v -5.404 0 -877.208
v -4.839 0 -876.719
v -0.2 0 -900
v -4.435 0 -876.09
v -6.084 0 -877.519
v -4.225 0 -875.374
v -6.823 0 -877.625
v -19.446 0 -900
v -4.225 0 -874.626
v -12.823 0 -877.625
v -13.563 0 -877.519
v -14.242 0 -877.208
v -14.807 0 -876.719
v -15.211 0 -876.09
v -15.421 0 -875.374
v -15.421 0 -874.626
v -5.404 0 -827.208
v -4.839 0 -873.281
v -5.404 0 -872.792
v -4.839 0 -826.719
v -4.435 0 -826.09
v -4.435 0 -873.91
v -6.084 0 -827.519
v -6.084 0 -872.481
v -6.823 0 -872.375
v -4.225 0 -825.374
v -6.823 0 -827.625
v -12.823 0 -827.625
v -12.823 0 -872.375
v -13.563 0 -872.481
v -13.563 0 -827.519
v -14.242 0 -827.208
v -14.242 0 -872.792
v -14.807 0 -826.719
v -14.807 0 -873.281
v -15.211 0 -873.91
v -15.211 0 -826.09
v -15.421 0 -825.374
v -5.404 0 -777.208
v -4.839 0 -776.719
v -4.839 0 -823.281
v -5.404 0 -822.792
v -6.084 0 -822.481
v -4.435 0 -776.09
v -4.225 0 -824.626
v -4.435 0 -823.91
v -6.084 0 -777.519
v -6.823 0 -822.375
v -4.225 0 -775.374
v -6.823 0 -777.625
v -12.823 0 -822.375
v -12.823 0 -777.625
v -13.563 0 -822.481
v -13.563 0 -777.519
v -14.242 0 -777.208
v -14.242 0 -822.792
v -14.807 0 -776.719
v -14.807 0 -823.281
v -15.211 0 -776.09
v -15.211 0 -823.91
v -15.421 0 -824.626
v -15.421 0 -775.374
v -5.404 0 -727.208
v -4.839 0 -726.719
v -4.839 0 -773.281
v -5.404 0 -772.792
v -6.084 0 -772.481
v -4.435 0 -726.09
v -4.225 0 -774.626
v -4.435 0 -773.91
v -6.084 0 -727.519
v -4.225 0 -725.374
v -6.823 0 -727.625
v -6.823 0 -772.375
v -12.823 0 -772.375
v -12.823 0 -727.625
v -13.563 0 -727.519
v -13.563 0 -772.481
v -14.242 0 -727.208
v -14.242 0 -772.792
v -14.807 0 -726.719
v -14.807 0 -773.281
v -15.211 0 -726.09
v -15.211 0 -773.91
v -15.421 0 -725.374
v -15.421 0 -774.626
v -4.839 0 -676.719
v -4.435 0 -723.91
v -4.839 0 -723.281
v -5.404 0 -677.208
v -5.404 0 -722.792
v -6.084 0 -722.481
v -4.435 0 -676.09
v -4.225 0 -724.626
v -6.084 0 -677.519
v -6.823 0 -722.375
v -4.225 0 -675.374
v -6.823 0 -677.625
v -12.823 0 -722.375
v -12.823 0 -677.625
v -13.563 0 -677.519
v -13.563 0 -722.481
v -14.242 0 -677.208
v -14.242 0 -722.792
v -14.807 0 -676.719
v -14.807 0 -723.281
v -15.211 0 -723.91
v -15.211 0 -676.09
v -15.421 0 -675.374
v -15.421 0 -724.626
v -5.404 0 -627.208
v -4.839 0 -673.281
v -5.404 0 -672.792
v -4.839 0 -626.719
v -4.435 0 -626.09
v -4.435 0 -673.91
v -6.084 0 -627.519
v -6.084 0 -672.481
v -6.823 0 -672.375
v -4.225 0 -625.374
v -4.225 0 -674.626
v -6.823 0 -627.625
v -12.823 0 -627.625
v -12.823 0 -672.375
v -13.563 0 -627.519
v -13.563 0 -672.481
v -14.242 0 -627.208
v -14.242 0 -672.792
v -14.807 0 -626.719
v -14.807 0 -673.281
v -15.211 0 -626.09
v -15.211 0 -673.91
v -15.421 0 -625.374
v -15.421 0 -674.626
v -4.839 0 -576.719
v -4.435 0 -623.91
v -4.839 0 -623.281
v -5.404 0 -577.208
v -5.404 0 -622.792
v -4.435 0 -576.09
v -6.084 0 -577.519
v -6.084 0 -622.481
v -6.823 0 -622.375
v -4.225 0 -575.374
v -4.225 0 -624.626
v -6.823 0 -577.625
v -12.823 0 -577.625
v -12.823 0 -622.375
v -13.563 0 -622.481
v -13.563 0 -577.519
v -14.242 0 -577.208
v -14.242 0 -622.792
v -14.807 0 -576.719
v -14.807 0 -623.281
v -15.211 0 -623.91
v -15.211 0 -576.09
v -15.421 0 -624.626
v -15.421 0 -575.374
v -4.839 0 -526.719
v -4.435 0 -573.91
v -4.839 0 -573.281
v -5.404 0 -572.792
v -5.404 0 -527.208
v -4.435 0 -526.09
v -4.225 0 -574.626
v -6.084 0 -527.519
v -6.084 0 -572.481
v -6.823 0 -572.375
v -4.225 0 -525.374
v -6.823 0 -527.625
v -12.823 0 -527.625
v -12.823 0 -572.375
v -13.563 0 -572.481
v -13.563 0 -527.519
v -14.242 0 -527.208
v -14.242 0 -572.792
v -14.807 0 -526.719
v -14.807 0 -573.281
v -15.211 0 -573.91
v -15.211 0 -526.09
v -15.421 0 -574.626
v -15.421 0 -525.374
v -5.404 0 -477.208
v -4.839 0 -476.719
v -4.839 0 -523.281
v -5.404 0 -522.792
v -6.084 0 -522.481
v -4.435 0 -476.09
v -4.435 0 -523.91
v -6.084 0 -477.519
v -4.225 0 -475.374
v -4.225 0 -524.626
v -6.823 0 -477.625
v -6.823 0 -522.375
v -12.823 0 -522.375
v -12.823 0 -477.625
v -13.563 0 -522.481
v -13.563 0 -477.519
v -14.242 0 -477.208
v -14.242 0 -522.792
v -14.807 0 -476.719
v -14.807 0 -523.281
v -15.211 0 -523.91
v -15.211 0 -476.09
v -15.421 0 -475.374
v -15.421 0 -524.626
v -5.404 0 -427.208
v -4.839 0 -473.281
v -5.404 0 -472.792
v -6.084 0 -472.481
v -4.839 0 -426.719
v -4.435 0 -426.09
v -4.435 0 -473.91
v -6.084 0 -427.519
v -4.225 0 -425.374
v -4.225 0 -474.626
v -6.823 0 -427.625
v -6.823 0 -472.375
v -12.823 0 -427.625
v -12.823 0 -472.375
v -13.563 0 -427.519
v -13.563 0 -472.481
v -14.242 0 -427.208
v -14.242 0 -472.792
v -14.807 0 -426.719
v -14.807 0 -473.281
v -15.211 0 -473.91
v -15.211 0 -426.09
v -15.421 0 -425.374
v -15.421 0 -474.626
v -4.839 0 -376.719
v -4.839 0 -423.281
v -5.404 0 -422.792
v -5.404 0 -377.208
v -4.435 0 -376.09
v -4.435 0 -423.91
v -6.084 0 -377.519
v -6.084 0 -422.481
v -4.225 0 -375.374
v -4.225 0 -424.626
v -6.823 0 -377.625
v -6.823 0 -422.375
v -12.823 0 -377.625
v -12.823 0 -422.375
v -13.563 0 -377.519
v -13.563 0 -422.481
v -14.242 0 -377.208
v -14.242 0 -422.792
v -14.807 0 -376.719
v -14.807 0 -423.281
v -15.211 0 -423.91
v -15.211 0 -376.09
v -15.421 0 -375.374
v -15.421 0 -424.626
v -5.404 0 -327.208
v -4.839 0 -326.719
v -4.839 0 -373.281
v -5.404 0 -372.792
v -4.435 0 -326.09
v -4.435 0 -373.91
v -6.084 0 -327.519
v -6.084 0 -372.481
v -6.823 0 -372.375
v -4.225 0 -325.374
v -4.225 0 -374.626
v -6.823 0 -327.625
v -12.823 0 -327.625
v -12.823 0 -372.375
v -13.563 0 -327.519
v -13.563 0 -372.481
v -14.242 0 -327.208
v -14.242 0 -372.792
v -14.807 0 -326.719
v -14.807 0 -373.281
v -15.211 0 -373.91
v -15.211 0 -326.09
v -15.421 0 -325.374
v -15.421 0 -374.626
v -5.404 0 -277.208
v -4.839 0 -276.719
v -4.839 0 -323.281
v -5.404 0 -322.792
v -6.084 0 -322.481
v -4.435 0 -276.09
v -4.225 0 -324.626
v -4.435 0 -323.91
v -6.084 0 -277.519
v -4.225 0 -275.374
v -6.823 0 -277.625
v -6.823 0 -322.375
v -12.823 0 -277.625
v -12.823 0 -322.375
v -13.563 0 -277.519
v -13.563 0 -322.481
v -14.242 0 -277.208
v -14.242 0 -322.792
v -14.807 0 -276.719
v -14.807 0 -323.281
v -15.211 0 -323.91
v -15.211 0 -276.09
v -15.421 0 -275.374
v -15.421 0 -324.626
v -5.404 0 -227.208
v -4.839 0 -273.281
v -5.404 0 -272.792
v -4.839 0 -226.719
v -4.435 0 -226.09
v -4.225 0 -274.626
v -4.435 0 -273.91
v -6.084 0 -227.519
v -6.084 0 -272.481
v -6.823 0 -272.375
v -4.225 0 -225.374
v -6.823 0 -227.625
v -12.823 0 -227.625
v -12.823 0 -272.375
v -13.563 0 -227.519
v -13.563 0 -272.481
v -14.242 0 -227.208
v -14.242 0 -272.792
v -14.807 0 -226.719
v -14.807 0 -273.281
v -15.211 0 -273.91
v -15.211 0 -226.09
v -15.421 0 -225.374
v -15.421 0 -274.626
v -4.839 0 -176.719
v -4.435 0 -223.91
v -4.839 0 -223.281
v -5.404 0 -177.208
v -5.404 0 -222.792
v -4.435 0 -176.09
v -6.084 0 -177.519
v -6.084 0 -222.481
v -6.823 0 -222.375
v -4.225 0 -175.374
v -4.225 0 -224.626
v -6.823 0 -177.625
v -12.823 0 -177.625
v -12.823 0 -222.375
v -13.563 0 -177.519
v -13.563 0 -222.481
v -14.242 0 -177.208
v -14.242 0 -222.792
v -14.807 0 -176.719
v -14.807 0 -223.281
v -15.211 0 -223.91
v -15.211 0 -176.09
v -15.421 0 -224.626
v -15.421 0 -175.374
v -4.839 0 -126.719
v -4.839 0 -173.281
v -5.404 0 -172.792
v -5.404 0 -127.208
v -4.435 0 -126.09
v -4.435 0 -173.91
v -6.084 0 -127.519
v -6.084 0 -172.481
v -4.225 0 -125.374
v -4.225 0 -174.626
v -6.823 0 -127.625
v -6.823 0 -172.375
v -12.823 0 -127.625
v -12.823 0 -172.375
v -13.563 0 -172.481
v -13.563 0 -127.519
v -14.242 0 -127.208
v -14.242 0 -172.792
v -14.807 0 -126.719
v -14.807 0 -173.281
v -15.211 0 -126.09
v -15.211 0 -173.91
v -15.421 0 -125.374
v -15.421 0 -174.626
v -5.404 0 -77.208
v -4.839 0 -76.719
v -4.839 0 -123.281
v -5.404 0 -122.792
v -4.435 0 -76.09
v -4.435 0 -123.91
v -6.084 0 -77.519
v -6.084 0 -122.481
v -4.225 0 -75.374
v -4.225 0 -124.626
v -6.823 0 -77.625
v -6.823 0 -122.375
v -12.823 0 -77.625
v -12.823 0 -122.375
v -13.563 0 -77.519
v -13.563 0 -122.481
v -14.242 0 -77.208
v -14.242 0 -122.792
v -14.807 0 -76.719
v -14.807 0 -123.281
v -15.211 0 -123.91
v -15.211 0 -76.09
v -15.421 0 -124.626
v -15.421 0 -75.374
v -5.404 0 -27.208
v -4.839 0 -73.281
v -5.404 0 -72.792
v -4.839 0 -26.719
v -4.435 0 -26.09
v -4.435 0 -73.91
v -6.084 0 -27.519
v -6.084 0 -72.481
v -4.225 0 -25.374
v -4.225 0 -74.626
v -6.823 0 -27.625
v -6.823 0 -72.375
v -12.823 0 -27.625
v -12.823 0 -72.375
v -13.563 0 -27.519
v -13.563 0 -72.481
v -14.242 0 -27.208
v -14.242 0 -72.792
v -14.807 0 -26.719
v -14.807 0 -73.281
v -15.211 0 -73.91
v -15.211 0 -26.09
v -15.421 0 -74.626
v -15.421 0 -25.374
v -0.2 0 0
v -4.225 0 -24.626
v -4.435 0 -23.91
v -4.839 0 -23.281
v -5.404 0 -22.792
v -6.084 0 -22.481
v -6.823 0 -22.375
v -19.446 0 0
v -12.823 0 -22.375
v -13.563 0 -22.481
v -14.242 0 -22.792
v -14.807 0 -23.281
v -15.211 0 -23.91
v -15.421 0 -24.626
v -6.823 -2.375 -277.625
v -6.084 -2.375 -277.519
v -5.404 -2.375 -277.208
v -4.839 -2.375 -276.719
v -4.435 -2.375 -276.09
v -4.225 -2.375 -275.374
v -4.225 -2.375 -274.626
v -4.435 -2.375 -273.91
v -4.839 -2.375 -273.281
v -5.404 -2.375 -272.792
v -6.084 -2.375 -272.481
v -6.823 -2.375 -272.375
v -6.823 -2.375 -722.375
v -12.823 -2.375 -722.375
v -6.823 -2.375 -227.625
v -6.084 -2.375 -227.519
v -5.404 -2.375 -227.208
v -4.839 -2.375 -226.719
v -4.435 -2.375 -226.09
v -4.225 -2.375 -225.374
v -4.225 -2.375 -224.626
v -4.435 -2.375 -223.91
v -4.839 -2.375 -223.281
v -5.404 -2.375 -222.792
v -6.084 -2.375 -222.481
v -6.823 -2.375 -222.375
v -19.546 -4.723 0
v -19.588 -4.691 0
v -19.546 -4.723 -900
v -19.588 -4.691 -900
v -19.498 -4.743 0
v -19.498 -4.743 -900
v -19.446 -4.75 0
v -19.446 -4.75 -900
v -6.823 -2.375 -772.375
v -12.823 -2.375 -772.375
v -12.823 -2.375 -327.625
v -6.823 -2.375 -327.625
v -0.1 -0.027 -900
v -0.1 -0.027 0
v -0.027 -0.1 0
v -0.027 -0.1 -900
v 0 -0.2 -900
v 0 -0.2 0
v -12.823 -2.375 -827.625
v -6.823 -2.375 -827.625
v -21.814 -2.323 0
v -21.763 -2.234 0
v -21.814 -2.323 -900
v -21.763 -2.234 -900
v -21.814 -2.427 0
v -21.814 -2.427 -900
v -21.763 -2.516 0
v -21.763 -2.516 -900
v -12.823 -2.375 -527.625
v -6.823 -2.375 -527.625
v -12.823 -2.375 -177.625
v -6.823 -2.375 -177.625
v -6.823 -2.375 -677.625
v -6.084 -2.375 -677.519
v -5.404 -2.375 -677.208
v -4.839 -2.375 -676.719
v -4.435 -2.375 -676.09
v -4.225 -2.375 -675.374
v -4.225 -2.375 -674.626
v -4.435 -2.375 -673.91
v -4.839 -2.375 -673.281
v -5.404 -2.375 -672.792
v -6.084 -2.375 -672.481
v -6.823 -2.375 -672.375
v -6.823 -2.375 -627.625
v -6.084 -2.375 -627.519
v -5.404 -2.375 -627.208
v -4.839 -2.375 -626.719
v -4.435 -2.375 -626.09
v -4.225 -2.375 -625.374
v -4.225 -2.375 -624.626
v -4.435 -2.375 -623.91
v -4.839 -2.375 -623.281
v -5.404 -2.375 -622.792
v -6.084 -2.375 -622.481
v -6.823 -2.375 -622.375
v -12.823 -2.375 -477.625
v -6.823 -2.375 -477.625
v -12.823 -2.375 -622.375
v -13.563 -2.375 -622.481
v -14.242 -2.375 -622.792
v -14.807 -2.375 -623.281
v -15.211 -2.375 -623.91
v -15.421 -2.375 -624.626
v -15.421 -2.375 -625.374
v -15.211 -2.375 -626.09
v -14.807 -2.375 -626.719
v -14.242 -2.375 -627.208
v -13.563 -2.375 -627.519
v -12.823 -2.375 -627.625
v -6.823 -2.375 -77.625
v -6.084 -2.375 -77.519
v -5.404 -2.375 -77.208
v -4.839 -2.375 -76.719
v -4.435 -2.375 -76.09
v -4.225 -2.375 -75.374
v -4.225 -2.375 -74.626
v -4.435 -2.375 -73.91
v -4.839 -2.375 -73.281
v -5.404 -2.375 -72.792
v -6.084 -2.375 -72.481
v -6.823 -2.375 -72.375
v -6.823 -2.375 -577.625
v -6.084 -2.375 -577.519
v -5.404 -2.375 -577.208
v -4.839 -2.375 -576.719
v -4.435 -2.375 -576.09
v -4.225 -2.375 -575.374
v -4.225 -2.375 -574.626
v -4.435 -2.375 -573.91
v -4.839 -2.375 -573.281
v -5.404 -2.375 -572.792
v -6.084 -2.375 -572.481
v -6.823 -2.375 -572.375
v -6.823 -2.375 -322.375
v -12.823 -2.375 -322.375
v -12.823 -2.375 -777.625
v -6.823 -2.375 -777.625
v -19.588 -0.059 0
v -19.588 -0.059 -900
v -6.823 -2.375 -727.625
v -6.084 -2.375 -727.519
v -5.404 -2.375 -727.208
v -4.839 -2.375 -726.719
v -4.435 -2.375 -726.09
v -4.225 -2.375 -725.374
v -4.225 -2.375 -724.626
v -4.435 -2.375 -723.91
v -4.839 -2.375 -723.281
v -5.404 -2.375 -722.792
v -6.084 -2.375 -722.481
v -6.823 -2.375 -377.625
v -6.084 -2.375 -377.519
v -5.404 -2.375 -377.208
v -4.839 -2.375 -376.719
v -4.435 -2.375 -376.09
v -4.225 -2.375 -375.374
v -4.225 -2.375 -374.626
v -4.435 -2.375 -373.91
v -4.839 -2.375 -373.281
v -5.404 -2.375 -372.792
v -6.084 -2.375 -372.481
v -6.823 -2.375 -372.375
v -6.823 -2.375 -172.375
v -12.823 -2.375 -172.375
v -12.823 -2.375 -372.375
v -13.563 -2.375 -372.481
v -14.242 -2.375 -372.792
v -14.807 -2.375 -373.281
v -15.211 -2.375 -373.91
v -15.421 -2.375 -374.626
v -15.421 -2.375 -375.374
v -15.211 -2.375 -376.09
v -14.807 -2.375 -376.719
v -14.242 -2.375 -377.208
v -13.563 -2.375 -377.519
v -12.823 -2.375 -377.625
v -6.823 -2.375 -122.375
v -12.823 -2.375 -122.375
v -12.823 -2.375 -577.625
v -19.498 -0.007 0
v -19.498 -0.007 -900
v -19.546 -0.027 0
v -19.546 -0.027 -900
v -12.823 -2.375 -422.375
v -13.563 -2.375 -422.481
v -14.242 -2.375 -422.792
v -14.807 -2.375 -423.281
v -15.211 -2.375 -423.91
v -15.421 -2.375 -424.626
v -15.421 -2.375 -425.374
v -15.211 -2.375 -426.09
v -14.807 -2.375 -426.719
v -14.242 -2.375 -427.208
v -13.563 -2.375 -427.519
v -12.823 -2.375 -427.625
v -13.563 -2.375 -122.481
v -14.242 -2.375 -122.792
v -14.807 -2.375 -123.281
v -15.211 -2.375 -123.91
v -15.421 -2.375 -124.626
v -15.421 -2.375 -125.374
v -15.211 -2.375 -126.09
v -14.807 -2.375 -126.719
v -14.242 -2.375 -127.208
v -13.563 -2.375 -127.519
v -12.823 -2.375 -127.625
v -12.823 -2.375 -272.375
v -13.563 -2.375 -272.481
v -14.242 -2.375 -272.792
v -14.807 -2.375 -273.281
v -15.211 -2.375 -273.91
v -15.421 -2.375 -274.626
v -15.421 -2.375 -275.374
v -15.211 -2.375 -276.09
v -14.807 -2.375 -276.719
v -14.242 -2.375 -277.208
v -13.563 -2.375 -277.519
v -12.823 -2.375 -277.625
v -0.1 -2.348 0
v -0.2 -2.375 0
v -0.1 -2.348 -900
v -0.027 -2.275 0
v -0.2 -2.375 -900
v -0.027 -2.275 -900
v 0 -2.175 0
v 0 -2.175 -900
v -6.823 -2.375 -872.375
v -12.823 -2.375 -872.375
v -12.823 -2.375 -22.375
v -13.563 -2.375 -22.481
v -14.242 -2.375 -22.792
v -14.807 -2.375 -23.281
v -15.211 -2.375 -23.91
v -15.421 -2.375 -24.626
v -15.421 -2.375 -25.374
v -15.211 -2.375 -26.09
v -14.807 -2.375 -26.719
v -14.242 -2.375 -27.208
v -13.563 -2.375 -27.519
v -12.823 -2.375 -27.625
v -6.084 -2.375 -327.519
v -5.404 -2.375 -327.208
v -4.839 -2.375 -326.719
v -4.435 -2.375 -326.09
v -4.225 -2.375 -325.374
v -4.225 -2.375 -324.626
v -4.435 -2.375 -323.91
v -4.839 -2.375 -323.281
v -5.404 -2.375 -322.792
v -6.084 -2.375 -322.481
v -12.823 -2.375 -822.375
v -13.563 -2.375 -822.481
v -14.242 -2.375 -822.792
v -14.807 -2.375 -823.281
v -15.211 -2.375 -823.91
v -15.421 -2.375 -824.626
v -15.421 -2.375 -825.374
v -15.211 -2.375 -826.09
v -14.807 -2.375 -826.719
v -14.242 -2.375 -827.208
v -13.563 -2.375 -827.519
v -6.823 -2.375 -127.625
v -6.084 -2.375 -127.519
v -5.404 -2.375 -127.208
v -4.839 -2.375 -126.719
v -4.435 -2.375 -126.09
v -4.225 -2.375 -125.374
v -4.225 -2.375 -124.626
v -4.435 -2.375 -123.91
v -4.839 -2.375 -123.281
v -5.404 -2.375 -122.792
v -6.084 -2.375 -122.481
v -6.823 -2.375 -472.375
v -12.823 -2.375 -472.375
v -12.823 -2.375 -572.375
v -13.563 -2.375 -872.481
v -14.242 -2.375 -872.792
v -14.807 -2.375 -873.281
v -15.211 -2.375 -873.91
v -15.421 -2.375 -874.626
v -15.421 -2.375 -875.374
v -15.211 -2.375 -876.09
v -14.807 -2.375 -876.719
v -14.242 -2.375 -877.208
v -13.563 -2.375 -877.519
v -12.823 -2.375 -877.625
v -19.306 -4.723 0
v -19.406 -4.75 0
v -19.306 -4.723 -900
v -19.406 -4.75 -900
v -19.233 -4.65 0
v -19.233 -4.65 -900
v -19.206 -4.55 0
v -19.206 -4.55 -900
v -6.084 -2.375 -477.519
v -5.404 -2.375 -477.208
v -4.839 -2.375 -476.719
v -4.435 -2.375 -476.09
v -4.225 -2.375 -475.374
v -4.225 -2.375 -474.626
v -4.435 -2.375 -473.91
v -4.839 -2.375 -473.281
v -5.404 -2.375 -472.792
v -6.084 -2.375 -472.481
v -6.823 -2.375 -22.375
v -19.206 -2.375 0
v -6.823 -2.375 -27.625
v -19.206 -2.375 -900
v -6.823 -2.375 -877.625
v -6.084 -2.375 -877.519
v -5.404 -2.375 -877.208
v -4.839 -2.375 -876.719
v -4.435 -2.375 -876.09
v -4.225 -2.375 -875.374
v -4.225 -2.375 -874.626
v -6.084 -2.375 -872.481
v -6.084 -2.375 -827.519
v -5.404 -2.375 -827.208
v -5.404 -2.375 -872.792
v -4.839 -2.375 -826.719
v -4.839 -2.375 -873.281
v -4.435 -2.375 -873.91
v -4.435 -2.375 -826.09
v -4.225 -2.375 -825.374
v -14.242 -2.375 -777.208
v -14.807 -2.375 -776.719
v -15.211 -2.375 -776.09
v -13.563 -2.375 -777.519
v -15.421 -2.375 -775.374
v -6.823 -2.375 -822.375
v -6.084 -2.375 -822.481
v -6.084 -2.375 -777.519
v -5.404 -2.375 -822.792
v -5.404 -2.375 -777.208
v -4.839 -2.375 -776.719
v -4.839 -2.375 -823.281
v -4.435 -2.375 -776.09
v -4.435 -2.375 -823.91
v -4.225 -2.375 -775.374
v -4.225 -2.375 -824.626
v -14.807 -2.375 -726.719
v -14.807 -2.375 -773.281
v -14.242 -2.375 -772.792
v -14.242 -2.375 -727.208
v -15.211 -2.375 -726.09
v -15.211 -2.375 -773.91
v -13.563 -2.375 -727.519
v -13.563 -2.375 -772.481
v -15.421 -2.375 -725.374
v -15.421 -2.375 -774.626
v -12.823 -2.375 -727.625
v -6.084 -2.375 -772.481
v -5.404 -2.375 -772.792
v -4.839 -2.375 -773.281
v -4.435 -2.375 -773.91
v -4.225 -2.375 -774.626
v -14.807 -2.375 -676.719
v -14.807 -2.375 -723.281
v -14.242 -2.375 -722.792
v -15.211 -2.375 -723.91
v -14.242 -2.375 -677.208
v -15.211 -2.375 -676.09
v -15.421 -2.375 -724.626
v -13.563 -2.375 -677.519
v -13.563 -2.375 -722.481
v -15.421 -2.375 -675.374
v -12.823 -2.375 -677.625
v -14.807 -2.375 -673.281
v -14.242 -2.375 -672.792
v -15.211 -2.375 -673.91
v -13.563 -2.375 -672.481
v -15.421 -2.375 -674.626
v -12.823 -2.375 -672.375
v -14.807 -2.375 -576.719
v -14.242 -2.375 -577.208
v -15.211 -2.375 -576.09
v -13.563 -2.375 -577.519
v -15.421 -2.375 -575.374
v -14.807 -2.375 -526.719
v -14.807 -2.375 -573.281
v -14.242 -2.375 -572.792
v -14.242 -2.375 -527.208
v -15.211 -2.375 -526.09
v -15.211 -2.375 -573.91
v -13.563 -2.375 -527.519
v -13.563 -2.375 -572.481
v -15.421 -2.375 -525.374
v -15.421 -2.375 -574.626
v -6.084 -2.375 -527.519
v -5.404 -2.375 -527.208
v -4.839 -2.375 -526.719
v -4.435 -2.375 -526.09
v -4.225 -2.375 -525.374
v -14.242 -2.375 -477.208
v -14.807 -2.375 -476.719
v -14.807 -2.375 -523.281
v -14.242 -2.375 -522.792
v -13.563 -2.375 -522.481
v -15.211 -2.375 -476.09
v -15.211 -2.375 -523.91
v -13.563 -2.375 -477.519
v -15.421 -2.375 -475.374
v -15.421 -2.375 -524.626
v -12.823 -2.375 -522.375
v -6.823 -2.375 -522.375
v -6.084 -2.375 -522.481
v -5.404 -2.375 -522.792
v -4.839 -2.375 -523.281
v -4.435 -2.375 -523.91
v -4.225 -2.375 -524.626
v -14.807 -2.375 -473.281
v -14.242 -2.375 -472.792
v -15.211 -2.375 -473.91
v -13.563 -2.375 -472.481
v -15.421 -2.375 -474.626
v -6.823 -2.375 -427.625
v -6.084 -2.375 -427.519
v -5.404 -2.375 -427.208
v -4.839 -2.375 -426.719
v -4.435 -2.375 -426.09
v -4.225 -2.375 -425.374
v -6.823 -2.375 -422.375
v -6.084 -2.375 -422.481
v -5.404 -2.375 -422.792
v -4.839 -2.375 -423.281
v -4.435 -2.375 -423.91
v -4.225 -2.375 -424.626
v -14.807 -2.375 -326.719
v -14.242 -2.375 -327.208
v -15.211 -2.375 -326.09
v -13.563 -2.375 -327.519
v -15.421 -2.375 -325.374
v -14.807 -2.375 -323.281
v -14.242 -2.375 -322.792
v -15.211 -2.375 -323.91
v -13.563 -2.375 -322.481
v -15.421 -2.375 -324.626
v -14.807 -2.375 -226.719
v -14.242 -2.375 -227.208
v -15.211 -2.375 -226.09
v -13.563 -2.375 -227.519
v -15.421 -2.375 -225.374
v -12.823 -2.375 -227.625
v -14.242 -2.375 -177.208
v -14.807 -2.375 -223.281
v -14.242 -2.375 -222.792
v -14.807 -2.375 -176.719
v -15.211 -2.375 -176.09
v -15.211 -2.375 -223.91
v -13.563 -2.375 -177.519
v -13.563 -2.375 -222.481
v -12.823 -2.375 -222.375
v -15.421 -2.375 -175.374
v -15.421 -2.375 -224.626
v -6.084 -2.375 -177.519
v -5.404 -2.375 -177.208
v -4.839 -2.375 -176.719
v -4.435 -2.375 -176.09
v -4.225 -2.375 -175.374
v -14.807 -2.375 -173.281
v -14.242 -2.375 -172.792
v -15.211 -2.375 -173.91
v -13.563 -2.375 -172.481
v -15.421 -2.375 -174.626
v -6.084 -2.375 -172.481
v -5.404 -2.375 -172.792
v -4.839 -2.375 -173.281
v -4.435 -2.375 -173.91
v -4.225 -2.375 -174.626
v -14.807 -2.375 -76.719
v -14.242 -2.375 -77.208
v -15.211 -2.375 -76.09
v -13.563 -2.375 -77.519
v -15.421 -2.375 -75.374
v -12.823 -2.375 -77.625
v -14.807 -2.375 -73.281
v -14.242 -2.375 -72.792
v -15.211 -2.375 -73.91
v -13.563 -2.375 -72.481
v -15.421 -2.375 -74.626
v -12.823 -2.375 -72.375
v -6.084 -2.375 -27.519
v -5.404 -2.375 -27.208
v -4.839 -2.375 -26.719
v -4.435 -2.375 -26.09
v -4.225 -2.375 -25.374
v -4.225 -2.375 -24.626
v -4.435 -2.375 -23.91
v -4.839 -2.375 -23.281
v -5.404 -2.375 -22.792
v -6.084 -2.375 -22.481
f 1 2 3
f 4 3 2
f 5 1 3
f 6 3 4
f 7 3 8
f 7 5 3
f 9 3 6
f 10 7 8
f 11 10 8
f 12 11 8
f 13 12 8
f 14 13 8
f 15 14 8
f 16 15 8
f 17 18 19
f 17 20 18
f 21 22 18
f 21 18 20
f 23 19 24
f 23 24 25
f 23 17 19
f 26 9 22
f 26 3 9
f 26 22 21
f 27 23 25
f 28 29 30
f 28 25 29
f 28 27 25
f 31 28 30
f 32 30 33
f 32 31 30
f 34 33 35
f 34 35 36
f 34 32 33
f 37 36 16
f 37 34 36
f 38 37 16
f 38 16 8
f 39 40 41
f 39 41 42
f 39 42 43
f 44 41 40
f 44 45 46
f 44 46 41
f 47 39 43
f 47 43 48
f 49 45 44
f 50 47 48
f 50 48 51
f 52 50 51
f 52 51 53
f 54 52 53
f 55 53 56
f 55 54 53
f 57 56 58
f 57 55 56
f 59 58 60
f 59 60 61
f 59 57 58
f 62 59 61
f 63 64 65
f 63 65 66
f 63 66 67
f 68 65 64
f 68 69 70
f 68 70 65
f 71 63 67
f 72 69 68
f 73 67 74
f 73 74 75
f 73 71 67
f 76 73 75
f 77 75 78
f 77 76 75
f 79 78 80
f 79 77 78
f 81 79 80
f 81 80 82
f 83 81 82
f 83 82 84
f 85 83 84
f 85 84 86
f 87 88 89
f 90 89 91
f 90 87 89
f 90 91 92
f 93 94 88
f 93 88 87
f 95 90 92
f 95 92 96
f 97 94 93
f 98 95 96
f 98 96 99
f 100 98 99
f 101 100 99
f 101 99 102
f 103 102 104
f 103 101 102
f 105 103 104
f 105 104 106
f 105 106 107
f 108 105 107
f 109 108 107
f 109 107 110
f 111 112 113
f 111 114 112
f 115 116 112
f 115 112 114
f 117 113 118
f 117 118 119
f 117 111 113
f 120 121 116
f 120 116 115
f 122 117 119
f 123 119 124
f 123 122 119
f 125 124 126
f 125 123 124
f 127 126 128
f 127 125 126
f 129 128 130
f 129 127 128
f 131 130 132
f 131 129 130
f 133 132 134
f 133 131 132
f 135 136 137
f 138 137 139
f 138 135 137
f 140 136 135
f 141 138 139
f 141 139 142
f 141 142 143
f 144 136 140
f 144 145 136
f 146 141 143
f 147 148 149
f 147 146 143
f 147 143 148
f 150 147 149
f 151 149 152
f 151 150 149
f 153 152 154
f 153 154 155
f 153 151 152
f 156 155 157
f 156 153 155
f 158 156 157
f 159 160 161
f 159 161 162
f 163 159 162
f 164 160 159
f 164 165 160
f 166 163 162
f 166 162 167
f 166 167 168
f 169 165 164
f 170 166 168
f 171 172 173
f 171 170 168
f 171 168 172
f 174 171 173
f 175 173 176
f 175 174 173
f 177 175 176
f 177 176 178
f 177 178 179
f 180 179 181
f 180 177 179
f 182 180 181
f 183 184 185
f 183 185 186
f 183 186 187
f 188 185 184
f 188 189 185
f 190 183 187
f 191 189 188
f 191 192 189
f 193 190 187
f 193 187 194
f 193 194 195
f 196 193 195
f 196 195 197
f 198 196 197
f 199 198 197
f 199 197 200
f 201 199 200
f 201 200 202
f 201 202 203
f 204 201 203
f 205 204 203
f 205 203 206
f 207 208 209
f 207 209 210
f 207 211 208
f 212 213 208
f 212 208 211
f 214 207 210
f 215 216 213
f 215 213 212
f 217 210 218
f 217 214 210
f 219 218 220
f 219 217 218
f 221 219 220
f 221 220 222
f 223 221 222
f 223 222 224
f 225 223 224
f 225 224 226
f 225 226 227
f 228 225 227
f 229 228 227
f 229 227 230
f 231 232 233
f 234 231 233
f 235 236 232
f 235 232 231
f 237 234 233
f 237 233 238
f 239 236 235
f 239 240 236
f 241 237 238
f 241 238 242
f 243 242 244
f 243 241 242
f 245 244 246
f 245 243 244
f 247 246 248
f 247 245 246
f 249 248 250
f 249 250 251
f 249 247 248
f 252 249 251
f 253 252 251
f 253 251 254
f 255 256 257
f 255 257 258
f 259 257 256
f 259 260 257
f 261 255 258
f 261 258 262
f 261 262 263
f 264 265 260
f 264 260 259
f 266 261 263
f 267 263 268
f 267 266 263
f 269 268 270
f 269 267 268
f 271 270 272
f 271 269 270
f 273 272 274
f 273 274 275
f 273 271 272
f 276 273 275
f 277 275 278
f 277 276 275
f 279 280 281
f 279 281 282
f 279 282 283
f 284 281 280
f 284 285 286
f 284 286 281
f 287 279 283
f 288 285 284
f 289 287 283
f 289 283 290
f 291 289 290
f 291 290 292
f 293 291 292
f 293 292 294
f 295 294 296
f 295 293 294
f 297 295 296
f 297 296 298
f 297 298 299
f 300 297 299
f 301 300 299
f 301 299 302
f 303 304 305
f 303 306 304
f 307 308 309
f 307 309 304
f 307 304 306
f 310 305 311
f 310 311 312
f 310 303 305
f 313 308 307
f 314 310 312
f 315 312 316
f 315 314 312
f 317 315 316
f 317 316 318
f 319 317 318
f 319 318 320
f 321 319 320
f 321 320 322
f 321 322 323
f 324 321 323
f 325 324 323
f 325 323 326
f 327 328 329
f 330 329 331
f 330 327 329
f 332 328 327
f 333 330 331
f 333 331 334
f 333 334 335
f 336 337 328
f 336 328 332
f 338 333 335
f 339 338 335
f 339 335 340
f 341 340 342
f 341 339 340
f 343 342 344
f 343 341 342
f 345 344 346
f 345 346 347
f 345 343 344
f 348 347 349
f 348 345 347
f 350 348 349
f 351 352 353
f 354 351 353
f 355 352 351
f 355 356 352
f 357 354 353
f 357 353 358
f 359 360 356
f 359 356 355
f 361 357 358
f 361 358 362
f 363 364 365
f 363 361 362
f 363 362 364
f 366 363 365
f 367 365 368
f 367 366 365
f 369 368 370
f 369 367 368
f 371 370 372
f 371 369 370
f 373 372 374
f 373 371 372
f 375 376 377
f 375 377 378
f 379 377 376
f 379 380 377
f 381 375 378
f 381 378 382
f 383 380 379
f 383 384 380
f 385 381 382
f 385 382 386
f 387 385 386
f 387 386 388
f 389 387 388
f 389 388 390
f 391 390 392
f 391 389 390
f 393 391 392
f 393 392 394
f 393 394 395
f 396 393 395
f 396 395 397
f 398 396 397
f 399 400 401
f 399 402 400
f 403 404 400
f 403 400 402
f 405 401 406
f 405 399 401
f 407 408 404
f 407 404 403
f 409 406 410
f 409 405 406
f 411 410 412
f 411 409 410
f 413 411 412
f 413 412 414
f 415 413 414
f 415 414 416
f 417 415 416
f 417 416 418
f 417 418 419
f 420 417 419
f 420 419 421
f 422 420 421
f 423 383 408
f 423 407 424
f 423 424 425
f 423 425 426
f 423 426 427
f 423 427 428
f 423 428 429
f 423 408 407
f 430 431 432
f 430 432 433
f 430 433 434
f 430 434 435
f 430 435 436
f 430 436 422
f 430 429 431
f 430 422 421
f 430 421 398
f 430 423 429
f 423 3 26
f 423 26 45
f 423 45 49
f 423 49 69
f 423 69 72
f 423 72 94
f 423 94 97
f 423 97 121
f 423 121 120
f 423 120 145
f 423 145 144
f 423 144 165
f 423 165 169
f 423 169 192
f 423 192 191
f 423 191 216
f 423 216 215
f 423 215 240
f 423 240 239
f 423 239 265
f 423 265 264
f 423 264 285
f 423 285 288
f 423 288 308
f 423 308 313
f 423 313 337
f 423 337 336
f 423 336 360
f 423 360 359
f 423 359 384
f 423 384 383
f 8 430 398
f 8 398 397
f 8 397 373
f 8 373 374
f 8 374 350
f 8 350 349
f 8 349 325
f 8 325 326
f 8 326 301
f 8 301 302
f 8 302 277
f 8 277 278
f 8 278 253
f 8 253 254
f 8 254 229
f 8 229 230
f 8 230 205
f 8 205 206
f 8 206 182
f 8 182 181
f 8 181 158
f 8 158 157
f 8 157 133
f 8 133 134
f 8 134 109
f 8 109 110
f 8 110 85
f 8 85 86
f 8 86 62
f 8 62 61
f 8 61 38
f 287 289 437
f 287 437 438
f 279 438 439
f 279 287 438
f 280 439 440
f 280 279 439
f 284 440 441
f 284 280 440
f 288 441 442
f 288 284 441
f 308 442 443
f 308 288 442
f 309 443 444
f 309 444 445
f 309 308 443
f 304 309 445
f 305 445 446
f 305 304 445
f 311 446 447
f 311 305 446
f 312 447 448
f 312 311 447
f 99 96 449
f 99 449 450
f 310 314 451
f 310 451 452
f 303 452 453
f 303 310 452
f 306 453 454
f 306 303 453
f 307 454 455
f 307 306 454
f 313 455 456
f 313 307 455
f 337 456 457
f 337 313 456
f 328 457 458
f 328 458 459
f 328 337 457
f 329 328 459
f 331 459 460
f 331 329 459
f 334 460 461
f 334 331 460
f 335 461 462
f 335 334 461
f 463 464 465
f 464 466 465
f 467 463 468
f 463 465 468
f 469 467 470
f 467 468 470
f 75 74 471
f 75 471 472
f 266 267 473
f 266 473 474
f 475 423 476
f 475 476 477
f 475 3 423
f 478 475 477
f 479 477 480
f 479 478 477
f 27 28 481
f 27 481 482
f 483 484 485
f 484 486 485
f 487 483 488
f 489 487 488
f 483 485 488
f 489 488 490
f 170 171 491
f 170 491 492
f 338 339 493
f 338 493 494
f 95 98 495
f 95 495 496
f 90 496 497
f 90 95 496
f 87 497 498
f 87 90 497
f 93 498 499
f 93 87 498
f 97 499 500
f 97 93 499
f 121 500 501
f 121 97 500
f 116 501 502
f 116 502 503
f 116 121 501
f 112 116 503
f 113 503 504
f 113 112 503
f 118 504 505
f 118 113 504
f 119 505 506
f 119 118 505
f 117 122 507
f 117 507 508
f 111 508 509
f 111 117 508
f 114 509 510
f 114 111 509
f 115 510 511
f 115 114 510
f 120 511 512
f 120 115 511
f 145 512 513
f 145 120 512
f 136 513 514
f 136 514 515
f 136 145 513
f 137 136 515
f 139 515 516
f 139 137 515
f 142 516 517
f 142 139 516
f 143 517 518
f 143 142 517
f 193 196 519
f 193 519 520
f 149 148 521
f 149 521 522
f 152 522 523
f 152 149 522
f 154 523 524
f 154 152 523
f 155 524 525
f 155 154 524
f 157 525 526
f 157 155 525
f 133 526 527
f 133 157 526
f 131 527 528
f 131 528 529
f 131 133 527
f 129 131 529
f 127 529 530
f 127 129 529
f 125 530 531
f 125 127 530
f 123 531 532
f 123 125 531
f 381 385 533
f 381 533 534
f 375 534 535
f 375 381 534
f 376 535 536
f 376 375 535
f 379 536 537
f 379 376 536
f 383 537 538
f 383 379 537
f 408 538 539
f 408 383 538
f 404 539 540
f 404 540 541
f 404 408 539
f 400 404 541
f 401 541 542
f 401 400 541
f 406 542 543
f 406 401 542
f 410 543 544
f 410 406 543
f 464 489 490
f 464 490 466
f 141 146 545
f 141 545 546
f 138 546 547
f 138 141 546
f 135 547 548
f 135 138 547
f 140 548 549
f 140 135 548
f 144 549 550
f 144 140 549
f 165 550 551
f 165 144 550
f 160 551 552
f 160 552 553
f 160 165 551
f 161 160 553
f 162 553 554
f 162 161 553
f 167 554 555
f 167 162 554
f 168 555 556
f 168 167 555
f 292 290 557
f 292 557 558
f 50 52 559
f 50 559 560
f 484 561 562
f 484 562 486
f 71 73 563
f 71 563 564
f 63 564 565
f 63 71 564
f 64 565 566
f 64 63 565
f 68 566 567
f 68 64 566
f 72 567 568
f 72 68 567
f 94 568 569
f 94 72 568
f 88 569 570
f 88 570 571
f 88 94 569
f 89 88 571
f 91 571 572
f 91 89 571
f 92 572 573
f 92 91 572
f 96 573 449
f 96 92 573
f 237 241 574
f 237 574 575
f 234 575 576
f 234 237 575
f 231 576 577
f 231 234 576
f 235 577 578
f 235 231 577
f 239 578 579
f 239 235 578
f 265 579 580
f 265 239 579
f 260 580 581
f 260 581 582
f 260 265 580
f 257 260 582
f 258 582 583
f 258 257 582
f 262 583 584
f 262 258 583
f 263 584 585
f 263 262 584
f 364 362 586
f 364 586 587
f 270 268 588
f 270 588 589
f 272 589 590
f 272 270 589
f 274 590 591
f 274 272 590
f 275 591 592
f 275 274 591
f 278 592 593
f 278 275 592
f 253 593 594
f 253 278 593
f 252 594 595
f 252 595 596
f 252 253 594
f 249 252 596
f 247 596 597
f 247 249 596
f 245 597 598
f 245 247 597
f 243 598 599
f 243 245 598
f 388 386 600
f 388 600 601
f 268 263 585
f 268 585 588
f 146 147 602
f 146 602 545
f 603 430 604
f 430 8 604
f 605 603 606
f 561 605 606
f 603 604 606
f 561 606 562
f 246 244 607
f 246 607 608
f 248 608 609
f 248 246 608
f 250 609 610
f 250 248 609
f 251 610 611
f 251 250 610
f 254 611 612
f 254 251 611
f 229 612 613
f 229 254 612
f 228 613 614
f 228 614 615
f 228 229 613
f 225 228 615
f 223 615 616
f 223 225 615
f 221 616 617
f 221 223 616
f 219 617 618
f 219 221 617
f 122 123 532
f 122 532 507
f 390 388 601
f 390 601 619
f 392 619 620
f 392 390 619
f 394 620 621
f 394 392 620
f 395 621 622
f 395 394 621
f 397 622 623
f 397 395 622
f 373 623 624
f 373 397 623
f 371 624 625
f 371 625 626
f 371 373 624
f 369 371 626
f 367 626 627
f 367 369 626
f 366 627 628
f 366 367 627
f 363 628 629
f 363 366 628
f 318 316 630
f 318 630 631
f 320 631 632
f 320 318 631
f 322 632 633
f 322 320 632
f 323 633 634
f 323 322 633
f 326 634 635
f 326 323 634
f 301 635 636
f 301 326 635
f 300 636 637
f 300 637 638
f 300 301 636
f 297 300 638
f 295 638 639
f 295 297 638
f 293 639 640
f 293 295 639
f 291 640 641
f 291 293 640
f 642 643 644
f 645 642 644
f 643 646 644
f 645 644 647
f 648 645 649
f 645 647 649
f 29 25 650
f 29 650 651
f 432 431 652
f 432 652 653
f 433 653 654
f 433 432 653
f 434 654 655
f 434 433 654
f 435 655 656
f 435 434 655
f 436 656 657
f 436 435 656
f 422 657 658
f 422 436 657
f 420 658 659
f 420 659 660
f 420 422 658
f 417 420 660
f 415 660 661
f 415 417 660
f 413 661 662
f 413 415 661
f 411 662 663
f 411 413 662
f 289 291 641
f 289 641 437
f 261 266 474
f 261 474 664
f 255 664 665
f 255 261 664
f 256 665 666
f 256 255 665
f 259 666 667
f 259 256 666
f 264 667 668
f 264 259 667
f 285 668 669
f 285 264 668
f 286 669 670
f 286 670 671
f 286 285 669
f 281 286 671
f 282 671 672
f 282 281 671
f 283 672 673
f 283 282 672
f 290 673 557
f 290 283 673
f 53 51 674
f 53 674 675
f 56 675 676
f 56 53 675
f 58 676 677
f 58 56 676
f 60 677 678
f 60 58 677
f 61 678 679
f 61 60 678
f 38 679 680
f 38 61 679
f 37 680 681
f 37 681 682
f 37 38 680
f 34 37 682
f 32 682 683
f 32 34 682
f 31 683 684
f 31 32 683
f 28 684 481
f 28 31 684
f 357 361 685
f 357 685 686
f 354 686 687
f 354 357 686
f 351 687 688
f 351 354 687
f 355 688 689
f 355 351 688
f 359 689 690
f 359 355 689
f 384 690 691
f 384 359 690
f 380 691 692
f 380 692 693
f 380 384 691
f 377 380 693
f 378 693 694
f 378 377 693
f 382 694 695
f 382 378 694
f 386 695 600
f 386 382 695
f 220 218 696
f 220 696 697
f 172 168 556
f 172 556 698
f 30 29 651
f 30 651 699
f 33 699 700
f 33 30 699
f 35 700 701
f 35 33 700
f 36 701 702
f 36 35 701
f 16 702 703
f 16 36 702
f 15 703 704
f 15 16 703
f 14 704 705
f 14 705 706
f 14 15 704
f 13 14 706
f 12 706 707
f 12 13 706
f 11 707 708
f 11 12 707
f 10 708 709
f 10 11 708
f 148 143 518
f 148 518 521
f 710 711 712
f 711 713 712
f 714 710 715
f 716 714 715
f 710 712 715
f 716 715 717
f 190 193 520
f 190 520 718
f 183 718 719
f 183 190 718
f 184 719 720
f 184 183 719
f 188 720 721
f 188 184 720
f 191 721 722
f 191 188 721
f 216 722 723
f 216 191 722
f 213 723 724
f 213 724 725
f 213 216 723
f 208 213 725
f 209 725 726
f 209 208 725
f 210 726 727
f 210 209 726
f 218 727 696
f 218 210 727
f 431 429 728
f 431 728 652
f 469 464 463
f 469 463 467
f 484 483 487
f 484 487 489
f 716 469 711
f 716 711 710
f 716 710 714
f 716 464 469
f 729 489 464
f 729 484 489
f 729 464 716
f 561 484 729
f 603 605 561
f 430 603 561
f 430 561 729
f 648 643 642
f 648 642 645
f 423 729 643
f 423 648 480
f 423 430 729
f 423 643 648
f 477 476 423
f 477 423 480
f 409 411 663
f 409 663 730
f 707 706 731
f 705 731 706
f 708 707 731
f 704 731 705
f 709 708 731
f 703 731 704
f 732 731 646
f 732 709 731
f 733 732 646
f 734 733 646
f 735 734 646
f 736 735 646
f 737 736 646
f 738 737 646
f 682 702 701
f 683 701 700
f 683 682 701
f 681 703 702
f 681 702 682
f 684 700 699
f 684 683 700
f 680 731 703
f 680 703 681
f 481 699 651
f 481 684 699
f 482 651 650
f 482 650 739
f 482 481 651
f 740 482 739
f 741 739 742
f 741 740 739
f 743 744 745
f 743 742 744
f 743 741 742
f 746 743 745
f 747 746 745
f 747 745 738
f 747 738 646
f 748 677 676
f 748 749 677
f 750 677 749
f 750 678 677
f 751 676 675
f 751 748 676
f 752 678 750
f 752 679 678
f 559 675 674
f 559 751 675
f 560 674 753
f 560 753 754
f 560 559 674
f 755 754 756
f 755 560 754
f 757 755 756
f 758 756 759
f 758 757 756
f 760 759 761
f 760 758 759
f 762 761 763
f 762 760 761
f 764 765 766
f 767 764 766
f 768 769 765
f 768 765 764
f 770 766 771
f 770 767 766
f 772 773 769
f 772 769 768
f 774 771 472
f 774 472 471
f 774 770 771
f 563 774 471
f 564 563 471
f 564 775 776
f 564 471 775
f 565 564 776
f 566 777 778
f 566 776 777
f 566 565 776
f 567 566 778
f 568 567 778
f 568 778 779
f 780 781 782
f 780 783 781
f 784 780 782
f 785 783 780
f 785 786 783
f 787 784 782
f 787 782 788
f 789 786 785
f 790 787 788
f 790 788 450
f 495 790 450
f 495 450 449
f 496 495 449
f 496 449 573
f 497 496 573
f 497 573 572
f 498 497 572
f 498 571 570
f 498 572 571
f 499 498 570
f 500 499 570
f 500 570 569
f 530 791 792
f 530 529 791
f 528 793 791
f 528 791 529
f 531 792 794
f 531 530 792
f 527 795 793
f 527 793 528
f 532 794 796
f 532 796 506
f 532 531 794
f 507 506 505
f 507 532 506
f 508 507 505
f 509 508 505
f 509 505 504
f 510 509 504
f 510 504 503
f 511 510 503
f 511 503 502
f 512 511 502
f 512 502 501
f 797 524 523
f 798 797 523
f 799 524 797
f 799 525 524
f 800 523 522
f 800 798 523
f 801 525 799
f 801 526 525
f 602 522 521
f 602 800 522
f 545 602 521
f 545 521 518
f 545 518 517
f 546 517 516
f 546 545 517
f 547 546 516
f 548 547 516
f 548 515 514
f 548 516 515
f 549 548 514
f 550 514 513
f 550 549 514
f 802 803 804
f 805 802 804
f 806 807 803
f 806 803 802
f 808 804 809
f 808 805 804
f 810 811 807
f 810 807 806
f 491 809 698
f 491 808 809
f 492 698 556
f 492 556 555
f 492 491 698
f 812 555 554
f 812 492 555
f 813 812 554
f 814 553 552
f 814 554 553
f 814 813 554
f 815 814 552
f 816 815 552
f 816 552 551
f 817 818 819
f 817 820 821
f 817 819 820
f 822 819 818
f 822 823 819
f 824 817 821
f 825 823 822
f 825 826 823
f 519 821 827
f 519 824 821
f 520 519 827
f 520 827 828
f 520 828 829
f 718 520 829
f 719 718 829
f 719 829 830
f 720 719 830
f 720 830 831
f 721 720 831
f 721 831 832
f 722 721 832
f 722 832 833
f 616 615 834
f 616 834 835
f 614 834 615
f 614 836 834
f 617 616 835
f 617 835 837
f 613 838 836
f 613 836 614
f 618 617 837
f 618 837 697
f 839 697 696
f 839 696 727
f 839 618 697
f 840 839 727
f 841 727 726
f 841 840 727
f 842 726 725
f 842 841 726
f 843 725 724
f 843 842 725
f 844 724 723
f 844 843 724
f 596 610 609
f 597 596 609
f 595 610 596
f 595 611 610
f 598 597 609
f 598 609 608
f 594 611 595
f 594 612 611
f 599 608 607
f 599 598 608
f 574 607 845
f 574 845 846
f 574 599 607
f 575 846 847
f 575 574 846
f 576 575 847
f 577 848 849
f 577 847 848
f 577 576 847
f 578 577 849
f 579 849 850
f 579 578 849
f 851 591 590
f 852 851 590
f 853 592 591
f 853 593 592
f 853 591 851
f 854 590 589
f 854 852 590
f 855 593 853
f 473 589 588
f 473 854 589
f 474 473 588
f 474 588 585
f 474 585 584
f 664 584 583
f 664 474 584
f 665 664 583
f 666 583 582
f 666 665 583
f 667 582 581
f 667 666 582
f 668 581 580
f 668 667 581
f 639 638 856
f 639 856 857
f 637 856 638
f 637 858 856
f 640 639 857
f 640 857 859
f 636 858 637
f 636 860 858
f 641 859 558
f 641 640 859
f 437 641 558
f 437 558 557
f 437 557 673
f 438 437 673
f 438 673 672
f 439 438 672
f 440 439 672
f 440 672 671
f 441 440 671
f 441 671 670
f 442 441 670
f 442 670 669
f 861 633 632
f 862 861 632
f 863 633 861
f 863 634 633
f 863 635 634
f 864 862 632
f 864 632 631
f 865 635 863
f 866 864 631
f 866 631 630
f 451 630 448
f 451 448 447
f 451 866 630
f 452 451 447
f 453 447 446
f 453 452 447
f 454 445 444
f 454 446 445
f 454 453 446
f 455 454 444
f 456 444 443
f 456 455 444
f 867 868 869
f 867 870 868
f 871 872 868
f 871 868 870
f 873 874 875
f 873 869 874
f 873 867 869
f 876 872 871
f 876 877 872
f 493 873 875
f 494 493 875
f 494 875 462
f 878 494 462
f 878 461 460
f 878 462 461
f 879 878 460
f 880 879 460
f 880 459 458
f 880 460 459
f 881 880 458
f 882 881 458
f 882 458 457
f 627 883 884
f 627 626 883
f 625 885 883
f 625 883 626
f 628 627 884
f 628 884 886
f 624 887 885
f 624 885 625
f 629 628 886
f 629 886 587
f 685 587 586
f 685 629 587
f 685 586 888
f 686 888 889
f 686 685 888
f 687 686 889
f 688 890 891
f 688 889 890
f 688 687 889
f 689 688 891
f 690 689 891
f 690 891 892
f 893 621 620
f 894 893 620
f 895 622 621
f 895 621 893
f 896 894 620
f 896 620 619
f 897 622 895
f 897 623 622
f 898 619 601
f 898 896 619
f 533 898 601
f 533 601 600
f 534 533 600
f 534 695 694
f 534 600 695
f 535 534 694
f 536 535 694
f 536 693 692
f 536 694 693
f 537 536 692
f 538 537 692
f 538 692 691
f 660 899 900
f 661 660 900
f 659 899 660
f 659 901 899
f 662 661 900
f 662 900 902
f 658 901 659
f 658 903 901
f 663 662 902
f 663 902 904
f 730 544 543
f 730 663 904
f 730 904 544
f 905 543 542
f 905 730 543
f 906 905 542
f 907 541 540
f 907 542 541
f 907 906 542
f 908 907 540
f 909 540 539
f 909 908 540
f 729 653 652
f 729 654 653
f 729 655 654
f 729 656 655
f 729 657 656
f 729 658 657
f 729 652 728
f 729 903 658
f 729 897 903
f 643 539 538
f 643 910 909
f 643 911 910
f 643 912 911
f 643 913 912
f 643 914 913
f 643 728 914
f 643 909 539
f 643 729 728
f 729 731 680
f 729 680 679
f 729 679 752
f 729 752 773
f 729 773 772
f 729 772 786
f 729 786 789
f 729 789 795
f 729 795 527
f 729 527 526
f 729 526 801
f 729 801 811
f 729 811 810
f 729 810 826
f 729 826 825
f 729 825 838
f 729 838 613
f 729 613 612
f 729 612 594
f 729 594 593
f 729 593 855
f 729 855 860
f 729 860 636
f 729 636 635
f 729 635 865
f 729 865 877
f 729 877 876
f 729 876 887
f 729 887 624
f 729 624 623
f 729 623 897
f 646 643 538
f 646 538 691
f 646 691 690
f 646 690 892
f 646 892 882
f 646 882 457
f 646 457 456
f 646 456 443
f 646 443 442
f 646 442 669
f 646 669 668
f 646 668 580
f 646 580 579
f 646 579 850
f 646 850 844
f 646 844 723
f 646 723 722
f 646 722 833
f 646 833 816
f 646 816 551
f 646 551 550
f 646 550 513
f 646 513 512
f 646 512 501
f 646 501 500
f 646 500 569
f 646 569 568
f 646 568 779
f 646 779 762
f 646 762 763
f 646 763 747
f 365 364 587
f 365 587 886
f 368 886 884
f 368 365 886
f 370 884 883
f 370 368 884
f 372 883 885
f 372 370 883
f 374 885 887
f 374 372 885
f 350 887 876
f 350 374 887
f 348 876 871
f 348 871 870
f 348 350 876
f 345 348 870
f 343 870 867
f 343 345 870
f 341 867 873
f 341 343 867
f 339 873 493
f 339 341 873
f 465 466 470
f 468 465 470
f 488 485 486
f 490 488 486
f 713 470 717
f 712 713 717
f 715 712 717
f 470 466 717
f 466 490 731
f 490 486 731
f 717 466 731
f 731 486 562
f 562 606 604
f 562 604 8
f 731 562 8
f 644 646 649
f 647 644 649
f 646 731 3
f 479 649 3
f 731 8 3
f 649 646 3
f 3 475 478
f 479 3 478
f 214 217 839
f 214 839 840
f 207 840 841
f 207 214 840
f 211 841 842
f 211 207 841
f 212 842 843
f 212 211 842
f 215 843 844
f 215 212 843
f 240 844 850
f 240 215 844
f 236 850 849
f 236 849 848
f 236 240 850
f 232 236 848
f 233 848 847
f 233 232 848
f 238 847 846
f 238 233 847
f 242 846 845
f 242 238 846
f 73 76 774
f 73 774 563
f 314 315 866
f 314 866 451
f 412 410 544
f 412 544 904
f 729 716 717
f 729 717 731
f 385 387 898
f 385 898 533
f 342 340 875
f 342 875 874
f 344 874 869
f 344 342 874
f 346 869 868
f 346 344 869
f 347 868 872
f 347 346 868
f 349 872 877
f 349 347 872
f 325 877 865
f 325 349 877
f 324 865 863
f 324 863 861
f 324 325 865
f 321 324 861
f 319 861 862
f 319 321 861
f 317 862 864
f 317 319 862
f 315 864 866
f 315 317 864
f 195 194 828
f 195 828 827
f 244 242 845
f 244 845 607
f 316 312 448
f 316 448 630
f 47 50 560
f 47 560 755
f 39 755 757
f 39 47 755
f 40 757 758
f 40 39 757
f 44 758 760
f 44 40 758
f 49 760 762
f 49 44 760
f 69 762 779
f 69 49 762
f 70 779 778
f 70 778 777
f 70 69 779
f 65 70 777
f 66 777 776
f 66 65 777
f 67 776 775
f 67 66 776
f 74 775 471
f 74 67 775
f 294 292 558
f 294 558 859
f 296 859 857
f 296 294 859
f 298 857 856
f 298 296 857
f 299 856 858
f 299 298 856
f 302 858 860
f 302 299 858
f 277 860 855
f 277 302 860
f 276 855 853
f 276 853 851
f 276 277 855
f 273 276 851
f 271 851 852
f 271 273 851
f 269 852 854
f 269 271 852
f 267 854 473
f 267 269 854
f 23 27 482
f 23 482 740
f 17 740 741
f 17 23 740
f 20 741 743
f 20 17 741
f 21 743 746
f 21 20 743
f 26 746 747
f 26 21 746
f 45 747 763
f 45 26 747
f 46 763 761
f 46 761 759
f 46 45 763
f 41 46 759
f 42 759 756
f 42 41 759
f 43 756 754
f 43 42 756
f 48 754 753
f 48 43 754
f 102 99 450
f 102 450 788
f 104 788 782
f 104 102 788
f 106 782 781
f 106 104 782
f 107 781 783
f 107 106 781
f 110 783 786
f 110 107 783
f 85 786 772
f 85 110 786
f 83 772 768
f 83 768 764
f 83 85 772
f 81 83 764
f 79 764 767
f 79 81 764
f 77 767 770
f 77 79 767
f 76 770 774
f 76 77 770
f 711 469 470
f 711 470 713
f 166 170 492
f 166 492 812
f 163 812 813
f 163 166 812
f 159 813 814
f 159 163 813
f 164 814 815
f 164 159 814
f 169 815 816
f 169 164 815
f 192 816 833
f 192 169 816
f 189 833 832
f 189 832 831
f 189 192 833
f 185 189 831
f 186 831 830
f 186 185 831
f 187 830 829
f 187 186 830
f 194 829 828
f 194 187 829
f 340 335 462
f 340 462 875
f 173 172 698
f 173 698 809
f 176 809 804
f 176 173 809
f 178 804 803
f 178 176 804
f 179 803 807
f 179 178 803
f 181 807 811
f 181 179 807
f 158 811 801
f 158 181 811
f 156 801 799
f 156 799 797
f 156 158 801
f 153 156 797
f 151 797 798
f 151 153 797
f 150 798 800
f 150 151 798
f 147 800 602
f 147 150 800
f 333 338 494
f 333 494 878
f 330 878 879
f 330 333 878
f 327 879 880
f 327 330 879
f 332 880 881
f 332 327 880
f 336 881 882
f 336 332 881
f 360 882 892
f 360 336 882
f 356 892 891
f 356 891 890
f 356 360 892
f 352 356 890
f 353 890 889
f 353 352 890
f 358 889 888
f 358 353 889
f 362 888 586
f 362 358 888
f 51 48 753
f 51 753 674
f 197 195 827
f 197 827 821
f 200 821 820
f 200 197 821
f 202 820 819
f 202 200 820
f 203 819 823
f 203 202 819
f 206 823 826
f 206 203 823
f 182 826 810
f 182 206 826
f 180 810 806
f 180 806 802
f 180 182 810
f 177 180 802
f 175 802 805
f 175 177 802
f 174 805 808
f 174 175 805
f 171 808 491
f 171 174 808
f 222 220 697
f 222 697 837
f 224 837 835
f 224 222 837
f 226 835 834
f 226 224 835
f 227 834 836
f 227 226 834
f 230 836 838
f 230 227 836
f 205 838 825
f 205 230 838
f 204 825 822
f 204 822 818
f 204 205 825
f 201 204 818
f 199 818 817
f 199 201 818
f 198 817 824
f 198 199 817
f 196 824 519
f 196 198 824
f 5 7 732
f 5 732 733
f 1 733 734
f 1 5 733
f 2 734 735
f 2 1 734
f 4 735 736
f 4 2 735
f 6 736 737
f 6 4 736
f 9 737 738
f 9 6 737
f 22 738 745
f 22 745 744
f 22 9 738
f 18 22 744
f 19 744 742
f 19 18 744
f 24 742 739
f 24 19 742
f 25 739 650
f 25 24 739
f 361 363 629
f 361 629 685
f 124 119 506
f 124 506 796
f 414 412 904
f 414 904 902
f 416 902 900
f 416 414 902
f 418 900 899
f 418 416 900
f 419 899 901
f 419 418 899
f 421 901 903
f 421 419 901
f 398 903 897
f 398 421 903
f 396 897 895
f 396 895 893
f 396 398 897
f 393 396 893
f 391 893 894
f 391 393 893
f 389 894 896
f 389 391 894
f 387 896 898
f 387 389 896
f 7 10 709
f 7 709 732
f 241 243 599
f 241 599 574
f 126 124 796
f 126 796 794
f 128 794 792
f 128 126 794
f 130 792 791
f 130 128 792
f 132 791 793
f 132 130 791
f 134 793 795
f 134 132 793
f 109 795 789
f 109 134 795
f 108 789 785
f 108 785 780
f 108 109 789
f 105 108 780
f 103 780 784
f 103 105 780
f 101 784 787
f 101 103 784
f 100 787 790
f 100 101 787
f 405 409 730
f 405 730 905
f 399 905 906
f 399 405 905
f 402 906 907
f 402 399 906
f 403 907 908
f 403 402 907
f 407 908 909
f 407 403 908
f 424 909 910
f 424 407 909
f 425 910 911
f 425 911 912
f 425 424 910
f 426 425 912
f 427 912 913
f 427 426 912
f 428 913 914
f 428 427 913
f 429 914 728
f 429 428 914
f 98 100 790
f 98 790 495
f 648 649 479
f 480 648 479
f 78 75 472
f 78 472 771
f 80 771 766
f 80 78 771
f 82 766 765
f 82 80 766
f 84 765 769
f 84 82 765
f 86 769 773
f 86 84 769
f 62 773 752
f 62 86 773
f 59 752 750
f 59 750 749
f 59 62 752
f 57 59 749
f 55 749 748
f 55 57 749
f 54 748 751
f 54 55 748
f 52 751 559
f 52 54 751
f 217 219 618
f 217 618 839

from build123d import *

# Parameters (mm, degrees)
BOSS_EXTRUDE1_DEPTH = 900
FILLET1_R           = 0.2
CUT_EXTRUDE1_DEPTH  = 2.375
LPATTERN1_COUNT     = 18
LPATTERN1_PITCH     = 50


with BuildPart() as part:
    # Sketch1 → Boss-Extrude1 (new body)
    with BuildSketch(Plane.XY):
        Polygon((0, 0), (-19.2062, 0), (-19.5291, 0), (-21.9041, -2.375), (-19.5291, -4.75), (-19.2062, -4.75), (-19.2062, -2.375), (0, -2.375), align=None)
    extrude(amount=-BOSS_EXTRUDE1_DEPTH)

    # Fillet1
    fillet1_edges = [part.edges().sort_by_distance(p)[0] for p in [
        (0, -2.375, -450),
        (-19.2062, -4.75, -450),
        (-19.5291, -4.75, -450),
        (-21.9041, -2.375, -450),
        (-19.5291, 0, -450),
        (0, 0, -450),
    ]]
    fillet(fillet1_edges, radius=FILLET1_R)

    # Sketch2 → Cut-Extrude1 (cut)
    with BuildSketch(Plane(origin=(0, 0, 0), x_dir=(1, 0, 0), z_dir=(0, 1, 0))):
        with BuildLine():
            Line((-12.823128644, 27.625), (-6.823128644, 27.625))
            ThreePointArc((-6.823128644, 27.625), (-4.198128644, 25), (-6.823128644, 22.375))
            Line((-6.823128644, 22.375), (-12.823128644, 22.375))
            ThreePointArc((-12.823128644, 22.375), (-15.448128644, 25), (-12.823128644, 27.625))
        make_face()
    cut_extrude1 = extrude(amount=-CUT_EXTRUDE1_DEPTH, mode=Mode.SUBTRACT)

    # LPattern1: Cut-Extrude1 ×18
    with Locations(*[(0, 0, -i * LPATTERN1_PITCH) for i in range(1, LPATTERN1_COUNT)]):
        add(cut_extrude1, mode=Mode.SUBTRACT)


solid = part.part
